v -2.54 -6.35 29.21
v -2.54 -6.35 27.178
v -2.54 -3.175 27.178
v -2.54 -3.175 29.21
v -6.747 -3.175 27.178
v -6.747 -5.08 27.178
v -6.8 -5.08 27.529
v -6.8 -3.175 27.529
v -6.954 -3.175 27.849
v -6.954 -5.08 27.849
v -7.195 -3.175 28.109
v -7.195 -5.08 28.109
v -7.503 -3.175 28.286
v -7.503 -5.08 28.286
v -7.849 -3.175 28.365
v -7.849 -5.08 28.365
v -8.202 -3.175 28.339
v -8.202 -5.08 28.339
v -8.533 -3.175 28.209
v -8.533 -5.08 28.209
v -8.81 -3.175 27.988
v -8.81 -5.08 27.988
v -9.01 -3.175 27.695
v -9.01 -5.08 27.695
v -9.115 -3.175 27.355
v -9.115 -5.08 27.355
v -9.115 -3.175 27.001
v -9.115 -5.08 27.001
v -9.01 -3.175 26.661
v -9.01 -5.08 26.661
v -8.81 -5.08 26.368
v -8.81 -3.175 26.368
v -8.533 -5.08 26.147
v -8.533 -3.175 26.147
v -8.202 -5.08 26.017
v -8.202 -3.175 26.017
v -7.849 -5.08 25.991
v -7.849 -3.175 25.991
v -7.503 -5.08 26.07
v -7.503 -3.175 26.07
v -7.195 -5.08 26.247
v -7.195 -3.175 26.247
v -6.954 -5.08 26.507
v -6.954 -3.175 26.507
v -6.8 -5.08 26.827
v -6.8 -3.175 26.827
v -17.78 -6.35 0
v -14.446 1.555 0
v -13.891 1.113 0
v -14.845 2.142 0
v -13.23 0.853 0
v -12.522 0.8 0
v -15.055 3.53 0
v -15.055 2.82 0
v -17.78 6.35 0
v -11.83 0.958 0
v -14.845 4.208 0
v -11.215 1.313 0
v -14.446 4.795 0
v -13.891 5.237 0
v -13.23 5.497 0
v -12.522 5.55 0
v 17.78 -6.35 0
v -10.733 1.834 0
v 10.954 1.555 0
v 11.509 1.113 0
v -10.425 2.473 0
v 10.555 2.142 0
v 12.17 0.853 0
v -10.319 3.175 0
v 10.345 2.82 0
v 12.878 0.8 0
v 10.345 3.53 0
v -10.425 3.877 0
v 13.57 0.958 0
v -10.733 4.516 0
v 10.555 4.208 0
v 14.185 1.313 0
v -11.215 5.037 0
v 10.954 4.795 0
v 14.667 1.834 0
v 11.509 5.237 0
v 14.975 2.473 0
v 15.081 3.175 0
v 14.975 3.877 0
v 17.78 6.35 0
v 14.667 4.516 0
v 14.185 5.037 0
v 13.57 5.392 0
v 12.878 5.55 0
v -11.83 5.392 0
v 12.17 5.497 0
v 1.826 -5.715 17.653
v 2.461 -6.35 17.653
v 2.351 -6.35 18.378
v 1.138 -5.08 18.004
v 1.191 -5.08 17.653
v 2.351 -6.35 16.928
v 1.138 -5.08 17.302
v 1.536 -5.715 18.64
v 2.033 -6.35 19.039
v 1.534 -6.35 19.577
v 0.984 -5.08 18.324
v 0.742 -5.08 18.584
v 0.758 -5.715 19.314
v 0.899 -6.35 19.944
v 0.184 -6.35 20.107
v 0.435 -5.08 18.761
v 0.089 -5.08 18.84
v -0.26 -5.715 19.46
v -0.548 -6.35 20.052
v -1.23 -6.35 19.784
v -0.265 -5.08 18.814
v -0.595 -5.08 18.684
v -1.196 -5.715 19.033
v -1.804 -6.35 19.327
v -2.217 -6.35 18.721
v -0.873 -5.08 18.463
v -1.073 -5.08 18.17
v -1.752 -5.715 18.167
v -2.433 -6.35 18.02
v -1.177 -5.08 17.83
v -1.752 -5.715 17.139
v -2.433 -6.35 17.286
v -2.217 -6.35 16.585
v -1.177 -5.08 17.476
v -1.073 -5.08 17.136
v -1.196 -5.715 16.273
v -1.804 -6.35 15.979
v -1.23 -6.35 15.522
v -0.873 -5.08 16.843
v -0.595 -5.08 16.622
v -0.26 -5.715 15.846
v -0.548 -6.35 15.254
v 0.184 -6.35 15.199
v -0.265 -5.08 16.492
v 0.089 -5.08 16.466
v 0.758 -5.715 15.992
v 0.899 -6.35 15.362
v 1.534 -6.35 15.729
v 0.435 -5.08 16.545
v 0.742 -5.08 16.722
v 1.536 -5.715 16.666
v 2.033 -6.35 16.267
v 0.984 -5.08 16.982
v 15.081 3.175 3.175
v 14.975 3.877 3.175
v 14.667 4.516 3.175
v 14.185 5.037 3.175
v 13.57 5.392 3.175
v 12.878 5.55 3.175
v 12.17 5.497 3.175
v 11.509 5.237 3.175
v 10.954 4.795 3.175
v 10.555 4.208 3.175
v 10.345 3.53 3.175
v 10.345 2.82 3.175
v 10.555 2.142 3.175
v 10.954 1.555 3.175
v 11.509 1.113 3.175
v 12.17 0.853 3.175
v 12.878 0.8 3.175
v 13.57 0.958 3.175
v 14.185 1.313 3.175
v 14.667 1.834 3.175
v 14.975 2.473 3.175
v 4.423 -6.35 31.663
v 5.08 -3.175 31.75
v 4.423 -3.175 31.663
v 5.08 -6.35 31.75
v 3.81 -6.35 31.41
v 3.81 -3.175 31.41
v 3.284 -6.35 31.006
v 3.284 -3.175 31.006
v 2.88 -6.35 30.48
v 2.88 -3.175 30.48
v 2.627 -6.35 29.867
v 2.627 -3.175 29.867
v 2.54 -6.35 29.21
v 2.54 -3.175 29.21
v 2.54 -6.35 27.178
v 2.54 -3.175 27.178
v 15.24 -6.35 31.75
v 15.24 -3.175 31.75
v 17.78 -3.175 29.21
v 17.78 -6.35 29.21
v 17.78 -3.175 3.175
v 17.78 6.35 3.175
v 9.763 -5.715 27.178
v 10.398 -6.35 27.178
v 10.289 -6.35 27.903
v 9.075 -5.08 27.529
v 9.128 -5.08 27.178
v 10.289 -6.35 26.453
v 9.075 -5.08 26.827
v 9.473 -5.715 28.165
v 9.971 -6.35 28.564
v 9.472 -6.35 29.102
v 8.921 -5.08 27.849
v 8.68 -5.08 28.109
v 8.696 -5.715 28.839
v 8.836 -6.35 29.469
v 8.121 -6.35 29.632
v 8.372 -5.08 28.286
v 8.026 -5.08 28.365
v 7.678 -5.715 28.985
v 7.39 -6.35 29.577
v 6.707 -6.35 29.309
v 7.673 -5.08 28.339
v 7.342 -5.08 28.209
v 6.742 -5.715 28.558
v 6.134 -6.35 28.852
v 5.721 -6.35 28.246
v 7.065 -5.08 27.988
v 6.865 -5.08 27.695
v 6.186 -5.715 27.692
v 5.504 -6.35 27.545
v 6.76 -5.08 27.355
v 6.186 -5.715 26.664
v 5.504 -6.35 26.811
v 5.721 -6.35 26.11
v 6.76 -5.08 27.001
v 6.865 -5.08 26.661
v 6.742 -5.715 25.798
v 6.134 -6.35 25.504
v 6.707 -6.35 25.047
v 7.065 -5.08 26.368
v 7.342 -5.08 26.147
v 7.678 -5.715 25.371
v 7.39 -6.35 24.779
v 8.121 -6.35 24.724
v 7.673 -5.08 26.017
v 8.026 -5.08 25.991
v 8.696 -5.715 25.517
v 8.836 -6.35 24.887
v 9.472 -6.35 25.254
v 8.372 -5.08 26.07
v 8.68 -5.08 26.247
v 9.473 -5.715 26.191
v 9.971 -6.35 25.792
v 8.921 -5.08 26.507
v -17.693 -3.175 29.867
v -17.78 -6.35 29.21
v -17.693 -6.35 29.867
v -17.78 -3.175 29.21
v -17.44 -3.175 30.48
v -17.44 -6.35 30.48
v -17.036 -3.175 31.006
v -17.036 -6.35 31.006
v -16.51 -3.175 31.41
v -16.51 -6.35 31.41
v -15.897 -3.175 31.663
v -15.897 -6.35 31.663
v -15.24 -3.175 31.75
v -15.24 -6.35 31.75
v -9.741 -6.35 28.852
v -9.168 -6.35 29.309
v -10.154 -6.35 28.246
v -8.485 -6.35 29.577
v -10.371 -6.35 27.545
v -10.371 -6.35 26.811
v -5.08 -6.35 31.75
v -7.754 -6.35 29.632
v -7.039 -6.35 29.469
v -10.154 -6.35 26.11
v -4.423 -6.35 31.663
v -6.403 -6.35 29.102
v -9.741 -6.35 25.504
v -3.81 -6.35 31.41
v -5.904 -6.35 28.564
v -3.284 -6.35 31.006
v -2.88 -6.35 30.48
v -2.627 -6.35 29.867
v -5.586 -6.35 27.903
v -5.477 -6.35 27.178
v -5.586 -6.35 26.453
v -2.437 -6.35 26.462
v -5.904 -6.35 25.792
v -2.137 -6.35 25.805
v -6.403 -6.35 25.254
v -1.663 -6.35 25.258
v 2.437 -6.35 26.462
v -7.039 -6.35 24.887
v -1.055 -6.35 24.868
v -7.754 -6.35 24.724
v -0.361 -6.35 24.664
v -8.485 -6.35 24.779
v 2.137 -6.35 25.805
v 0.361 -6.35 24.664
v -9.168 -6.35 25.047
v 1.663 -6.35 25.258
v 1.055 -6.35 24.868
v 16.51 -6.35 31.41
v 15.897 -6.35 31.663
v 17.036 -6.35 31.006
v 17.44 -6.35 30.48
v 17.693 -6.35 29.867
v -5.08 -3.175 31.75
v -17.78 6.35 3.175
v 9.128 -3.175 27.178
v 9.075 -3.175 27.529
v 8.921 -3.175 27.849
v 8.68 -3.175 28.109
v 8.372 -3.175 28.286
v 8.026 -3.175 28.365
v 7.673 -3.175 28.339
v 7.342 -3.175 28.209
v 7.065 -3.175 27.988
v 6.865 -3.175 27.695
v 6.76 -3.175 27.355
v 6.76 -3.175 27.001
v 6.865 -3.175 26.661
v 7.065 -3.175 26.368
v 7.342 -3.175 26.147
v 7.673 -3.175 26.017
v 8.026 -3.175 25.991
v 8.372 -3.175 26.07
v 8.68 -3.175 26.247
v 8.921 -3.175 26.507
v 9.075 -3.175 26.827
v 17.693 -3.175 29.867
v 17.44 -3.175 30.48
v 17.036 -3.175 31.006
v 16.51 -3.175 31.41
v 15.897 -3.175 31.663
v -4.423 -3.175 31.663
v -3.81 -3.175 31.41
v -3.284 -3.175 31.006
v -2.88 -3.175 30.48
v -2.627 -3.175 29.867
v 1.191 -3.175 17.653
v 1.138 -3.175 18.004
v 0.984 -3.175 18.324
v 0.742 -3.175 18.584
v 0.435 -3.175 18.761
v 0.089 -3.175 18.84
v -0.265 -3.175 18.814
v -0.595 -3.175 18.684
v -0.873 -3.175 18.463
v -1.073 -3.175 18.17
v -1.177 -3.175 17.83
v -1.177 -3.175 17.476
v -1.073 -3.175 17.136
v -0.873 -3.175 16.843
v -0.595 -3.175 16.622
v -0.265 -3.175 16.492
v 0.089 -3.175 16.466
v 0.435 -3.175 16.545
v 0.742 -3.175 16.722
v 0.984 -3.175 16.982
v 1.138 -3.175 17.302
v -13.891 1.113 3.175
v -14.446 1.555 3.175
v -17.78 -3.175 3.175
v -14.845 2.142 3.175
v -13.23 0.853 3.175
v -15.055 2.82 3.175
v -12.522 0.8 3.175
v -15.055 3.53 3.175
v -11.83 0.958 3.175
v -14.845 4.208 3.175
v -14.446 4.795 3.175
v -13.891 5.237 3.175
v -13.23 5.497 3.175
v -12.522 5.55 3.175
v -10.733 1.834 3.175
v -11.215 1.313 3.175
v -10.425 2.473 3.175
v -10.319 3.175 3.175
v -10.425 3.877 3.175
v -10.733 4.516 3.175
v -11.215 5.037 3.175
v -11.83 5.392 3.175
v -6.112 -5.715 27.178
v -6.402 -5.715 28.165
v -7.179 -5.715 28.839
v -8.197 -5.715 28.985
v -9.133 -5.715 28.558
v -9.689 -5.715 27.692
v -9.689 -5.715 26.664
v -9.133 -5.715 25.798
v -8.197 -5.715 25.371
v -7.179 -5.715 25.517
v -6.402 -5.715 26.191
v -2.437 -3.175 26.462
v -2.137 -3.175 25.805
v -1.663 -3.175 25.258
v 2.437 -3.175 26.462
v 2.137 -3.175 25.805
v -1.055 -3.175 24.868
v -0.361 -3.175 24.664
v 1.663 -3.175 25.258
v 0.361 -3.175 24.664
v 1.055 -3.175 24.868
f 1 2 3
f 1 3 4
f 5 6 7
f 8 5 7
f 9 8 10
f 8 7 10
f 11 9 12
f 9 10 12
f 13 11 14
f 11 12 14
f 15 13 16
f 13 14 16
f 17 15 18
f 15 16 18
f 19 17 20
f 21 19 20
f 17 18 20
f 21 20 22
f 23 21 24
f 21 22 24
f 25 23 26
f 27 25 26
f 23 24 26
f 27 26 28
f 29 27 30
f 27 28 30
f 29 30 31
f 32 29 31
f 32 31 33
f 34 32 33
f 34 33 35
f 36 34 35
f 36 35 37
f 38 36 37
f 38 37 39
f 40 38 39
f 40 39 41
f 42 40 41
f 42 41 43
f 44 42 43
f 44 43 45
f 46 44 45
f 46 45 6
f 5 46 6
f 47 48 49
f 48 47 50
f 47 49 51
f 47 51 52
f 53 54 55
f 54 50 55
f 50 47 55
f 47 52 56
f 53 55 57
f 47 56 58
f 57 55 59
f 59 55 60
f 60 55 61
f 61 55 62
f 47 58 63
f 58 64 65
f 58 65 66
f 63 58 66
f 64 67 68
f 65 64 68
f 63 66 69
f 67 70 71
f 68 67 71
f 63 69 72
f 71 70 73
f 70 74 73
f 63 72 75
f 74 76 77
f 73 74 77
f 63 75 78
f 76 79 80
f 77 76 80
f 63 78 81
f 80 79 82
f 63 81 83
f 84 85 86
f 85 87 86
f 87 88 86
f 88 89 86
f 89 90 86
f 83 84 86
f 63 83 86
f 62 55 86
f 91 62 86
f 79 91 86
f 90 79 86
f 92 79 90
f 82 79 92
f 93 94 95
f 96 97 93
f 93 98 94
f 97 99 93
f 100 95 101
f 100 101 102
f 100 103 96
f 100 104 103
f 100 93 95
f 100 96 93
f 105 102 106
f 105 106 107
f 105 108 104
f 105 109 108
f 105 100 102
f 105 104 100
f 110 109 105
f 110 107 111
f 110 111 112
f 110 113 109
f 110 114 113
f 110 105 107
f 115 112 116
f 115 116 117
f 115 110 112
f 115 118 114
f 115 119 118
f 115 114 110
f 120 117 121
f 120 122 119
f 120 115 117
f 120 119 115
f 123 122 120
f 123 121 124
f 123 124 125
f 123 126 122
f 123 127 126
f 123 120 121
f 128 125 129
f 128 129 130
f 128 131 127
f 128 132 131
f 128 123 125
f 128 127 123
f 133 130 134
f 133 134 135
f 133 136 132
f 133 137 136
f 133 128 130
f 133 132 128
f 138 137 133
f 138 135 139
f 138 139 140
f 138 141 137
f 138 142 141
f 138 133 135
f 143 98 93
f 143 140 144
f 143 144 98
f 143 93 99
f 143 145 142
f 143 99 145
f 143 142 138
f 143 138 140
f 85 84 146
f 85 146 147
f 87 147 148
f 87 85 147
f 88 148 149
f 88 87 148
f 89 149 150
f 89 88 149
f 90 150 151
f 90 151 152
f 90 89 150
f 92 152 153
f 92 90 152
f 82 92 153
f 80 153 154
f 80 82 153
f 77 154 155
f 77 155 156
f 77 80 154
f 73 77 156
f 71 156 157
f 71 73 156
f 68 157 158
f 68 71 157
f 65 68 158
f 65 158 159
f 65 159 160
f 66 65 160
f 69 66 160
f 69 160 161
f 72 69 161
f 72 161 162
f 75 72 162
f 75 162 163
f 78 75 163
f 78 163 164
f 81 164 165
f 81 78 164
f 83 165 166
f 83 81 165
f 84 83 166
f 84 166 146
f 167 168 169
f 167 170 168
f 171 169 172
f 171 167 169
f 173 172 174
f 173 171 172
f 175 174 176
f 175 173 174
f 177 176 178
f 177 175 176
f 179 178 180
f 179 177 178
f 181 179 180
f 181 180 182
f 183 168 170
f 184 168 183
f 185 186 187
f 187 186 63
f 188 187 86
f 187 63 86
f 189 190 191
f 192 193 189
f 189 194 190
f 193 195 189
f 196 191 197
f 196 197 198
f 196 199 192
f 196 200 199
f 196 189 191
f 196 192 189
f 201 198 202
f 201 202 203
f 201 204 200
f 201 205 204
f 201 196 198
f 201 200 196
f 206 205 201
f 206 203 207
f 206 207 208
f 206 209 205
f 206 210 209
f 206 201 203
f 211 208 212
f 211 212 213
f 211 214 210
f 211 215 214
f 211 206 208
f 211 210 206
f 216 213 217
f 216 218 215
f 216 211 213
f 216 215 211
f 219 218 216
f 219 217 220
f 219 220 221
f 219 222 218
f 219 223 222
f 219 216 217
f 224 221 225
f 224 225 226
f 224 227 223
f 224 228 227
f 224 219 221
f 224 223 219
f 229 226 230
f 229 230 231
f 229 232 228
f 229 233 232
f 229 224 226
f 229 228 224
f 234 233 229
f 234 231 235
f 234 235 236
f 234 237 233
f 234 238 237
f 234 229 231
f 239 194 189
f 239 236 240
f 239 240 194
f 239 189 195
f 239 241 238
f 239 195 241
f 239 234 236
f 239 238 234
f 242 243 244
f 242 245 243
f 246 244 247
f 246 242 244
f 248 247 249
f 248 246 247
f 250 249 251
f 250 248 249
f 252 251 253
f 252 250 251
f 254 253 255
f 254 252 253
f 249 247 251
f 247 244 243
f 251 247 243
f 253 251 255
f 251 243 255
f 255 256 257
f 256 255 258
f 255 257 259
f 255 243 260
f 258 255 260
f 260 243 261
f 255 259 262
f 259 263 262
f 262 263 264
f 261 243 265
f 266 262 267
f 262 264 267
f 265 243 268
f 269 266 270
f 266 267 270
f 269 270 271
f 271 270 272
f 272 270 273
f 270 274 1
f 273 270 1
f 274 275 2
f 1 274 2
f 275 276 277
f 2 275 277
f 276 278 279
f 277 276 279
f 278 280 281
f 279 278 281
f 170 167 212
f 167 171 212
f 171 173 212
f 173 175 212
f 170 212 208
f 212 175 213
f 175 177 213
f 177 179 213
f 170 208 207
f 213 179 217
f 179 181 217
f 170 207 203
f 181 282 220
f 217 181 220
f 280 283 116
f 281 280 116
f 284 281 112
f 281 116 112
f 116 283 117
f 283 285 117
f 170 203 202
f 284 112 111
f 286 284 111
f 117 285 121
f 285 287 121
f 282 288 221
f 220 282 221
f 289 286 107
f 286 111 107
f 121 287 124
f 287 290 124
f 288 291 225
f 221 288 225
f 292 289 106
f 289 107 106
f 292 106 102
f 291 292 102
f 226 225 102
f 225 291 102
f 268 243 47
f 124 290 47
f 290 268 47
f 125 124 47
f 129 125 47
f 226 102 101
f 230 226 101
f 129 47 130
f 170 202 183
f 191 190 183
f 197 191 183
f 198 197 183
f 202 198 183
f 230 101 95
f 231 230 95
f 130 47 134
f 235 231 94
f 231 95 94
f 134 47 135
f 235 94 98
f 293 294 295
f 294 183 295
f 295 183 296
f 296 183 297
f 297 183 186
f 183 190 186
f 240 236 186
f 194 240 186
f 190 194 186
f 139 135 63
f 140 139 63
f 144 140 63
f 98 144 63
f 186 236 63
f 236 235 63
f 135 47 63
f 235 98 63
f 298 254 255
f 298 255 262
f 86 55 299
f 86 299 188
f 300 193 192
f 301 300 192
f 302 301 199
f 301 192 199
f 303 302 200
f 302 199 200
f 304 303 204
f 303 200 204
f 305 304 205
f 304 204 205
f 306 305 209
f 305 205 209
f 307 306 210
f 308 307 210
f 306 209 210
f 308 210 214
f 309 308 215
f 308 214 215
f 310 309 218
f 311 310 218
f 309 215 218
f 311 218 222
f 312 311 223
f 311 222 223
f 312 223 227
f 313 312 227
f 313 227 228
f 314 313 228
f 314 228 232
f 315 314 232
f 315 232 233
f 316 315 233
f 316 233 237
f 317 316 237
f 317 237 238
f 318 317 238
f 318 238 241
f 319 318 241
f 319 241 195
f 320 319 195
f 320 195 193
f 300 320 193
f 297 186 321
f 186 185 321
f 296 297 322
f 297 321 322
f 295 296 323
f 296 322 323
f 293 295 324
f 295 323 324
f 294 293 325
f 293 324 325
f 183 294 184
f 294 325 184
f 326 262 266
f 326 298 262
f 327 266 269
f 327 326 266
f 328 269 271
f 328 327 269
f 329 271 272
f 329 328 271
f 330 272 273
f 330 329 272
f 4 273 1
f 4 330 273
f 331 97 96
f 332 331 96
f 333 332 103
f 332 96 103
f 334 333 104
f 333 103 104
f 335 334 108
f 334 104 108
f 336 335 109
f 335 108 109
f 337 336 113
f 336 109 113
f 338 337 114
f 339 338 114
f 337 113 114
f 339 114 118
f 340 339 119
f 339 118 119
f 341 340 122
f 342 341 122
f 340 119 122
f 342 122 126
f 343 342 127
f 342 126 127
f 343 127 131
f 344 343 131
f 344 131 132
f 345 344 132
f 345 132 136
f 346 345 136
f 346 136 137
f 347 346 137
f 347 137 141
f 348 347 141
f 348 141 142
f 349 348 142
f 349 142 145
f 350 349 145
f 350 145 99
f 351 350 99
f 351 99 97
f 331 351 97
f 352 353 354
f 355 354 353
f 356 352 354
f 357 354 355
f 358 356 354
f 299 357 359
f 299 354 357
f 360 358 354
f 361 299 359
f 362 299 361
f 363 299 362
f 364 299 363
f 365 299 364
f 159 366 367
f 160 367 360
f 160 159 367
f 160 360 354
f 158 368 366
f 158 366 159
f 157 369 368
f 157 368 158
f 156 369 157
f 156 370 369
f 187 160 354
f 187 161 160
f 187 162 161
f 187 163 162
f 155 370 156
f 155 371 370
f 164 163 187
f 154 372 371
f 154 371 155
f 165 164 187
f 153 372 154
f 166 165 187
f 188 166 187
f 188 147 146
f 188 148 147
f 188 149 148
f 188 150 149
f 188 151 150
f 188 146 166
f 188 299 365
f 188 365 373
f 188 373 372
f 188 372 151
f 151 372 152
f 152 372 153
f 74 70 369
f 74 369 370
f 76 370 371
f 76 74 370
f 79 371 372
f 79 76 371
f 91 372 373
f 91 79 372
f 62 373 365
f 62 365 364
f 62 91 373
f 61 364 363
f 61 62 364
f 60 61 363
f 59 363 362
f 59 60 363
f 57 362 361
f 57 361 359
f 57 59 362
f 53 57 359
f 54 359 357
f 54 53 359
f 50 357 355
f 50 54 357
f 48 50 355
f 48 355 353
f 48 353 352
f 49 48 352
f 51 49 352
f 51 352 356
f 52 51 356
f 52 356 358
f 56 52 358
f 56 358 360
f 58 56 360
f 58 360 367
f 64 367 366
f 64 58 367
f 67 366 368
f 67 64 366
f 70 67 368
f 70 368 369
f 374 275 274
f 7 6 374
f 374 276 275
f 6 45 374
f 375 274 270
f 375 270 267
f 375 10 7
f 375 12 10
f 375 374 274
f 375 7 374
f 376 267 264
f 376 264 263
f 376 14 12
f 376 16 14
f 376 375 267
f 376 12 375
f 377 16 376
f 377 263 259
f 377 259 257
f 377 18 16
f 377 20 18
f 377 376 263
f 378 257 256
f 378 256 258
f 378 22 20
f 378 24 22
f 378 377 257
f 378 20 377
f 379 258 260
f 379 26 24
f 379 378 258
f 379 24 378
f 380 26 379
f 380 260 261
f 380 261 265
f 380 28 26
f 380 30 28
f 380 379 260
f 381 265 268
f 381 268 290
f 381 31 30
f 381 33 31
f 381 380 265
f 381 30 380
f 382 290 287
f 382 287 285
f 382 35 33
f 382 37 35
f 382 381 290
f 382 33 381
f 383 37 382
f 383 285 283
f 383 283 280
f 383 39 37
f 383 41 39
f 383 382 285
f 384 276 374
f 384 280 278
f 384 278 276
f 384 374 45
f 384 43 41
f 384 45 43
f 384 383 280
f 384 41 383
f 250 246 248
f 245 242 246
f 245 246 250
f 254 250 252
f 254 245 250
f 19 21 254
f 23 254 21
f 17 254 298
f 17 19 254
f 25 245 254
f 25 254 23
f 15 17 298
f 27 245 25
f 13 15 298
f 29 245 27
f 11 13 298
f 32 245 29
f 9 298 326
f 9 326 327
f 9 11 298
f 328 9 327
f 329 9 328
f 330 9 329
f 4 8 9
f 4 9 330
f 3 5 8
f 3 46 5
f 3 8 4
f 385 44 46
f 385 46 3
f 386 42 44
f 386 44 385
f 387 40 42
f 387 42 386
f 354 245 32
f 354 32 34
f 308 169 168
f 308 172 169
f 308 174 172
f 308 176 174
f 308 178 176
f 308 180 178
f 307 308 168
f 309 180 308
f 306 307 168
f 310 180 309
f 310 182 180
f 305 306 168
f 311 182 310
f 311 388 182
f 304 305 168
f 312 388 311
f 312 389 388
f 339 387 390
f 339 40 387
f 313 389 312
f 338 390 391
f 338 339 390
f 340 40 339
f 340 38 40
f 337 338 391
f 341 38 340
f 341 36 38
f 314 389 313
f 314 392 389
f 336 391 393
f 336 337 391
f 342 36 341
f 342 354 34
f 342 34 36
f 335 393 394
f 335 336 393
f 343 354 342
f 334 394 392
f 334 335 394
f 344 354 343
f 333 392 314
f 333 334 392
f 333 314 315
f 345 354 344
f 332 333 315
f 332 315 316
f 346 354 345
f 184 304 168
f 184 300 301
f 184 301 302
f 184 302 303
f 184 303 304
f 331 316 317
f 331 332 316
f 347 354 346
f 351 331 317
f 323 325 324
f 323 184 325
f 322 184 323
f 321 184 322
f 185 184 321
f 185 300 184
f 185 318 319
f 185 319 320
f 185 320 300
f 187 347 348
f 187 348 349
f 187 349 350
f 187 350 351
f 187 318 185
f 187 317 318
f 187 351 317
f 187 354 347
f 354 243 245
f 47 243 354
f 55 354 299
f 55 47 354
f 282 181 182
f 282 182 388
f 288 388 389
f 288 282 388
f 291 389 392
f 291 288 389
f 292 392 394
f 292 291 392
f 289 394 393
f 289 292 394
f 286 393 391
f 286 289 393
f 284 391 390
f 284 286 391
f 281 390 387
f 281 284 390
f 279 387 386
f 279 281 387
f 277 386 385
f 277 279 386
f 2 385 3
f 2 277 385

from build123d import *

# Parameters (mm, degrees)
SKETCH1_W           = 35.56
SKETCH1_H           = 12.7
SKETCH1_R           = 2.38125
BOSS_EXTRUDE1_DEPTH = 3.175
SKETCH7_W           = 35.56
SKETCH7_H           = 3.175
BOSS_EXTRUDE3_DEPTH = 28.575
SKETCH11_R          = 1.190625
CUT_EXTRUDE1_DEPTH  = 13.7
FILLET1_R           = 2.54
CHAMFER2_SIZE       = 1.27


with BuildPart() as part:
    # Sketch1 → Boss-Extrude1 (new body)
    with BuildSketch(Plane.XY):
        Rectangle(SKETCH1_W, SKETCH1_H)
        with Locations((-12.7, 3.175)):
            Circle(SKETCH1_R, mode=Mode.SUBTRACT)
        with Locations((12.7, 3.175)):
            Circle(SKETCH1_R, mode=Mode.SUBTRACT)
    extrude(amount=BOSS_EXTRUDE1_DEPTH)

    # Sketch7 → Boss-Extrude3 (add)
    with BuildSketch(Plane.XY.offset(3.175)):
        with Locations((0, -4.7625)):
            Rectangle(SKETCH7_W, SKETCH7_H)
    extrude(amount=BOSS_EXTRUDE3_DEPTH)

    # Sketch11 → Cut-Extrude1 (cut, through all)
    with BuildSketch(Plane.XZ.offset(6.35)):
        with Locations((-7.9375, 27.178)):
            Circle(SKETCH11_R)
        with Locations((7.9375, 27.178)):
            Circle(SKETCH11_R)
        with Locations((0, 17.653)):
            Circle(SKETCH11_R)
        with BuildLine():
            Line((-2.54, 48.261780908), (2.54, 48.261780908))
            Line((2.54, 48.261780908), (2.54, 27.178))
            ThreePointArc((2.54, 27.178), (0, 24.638), (-2.54, 27.178))
            Line((-2.54, 27.178), (-2.54, 48.261780908))
        make_face()
    extrude(amount=-CUT_EXTRUDE1_DEPTH, mode=Mode.SUBTRACT)

    # Fillet1
    fillet1_edges = [part.edges().sort_by_distance(p)[0] for p in [
        (-17.78, -4.7625, 31.75),
        (17.78, -4.7625, 31.75),
        (2.54, -4.7625, 31.75),
        (-2.54, -4.7625, 31.75),
    ]]
    fillet(fillet1_edges, radius=FILLET1_R)

    # Chamfer2
    chamfer2_edges = [part.edges().sort_by_distance(p)[0] for p in [
        (-9.128125, -6.35, 27.178),
        (6.746875, -6.35, 27.178),
        (-1.190625, -6.35, 17.653),
    ]]
    chamfer(chamfer2_edges, length=CHAMFER2_SIZE)


solid = part.part
